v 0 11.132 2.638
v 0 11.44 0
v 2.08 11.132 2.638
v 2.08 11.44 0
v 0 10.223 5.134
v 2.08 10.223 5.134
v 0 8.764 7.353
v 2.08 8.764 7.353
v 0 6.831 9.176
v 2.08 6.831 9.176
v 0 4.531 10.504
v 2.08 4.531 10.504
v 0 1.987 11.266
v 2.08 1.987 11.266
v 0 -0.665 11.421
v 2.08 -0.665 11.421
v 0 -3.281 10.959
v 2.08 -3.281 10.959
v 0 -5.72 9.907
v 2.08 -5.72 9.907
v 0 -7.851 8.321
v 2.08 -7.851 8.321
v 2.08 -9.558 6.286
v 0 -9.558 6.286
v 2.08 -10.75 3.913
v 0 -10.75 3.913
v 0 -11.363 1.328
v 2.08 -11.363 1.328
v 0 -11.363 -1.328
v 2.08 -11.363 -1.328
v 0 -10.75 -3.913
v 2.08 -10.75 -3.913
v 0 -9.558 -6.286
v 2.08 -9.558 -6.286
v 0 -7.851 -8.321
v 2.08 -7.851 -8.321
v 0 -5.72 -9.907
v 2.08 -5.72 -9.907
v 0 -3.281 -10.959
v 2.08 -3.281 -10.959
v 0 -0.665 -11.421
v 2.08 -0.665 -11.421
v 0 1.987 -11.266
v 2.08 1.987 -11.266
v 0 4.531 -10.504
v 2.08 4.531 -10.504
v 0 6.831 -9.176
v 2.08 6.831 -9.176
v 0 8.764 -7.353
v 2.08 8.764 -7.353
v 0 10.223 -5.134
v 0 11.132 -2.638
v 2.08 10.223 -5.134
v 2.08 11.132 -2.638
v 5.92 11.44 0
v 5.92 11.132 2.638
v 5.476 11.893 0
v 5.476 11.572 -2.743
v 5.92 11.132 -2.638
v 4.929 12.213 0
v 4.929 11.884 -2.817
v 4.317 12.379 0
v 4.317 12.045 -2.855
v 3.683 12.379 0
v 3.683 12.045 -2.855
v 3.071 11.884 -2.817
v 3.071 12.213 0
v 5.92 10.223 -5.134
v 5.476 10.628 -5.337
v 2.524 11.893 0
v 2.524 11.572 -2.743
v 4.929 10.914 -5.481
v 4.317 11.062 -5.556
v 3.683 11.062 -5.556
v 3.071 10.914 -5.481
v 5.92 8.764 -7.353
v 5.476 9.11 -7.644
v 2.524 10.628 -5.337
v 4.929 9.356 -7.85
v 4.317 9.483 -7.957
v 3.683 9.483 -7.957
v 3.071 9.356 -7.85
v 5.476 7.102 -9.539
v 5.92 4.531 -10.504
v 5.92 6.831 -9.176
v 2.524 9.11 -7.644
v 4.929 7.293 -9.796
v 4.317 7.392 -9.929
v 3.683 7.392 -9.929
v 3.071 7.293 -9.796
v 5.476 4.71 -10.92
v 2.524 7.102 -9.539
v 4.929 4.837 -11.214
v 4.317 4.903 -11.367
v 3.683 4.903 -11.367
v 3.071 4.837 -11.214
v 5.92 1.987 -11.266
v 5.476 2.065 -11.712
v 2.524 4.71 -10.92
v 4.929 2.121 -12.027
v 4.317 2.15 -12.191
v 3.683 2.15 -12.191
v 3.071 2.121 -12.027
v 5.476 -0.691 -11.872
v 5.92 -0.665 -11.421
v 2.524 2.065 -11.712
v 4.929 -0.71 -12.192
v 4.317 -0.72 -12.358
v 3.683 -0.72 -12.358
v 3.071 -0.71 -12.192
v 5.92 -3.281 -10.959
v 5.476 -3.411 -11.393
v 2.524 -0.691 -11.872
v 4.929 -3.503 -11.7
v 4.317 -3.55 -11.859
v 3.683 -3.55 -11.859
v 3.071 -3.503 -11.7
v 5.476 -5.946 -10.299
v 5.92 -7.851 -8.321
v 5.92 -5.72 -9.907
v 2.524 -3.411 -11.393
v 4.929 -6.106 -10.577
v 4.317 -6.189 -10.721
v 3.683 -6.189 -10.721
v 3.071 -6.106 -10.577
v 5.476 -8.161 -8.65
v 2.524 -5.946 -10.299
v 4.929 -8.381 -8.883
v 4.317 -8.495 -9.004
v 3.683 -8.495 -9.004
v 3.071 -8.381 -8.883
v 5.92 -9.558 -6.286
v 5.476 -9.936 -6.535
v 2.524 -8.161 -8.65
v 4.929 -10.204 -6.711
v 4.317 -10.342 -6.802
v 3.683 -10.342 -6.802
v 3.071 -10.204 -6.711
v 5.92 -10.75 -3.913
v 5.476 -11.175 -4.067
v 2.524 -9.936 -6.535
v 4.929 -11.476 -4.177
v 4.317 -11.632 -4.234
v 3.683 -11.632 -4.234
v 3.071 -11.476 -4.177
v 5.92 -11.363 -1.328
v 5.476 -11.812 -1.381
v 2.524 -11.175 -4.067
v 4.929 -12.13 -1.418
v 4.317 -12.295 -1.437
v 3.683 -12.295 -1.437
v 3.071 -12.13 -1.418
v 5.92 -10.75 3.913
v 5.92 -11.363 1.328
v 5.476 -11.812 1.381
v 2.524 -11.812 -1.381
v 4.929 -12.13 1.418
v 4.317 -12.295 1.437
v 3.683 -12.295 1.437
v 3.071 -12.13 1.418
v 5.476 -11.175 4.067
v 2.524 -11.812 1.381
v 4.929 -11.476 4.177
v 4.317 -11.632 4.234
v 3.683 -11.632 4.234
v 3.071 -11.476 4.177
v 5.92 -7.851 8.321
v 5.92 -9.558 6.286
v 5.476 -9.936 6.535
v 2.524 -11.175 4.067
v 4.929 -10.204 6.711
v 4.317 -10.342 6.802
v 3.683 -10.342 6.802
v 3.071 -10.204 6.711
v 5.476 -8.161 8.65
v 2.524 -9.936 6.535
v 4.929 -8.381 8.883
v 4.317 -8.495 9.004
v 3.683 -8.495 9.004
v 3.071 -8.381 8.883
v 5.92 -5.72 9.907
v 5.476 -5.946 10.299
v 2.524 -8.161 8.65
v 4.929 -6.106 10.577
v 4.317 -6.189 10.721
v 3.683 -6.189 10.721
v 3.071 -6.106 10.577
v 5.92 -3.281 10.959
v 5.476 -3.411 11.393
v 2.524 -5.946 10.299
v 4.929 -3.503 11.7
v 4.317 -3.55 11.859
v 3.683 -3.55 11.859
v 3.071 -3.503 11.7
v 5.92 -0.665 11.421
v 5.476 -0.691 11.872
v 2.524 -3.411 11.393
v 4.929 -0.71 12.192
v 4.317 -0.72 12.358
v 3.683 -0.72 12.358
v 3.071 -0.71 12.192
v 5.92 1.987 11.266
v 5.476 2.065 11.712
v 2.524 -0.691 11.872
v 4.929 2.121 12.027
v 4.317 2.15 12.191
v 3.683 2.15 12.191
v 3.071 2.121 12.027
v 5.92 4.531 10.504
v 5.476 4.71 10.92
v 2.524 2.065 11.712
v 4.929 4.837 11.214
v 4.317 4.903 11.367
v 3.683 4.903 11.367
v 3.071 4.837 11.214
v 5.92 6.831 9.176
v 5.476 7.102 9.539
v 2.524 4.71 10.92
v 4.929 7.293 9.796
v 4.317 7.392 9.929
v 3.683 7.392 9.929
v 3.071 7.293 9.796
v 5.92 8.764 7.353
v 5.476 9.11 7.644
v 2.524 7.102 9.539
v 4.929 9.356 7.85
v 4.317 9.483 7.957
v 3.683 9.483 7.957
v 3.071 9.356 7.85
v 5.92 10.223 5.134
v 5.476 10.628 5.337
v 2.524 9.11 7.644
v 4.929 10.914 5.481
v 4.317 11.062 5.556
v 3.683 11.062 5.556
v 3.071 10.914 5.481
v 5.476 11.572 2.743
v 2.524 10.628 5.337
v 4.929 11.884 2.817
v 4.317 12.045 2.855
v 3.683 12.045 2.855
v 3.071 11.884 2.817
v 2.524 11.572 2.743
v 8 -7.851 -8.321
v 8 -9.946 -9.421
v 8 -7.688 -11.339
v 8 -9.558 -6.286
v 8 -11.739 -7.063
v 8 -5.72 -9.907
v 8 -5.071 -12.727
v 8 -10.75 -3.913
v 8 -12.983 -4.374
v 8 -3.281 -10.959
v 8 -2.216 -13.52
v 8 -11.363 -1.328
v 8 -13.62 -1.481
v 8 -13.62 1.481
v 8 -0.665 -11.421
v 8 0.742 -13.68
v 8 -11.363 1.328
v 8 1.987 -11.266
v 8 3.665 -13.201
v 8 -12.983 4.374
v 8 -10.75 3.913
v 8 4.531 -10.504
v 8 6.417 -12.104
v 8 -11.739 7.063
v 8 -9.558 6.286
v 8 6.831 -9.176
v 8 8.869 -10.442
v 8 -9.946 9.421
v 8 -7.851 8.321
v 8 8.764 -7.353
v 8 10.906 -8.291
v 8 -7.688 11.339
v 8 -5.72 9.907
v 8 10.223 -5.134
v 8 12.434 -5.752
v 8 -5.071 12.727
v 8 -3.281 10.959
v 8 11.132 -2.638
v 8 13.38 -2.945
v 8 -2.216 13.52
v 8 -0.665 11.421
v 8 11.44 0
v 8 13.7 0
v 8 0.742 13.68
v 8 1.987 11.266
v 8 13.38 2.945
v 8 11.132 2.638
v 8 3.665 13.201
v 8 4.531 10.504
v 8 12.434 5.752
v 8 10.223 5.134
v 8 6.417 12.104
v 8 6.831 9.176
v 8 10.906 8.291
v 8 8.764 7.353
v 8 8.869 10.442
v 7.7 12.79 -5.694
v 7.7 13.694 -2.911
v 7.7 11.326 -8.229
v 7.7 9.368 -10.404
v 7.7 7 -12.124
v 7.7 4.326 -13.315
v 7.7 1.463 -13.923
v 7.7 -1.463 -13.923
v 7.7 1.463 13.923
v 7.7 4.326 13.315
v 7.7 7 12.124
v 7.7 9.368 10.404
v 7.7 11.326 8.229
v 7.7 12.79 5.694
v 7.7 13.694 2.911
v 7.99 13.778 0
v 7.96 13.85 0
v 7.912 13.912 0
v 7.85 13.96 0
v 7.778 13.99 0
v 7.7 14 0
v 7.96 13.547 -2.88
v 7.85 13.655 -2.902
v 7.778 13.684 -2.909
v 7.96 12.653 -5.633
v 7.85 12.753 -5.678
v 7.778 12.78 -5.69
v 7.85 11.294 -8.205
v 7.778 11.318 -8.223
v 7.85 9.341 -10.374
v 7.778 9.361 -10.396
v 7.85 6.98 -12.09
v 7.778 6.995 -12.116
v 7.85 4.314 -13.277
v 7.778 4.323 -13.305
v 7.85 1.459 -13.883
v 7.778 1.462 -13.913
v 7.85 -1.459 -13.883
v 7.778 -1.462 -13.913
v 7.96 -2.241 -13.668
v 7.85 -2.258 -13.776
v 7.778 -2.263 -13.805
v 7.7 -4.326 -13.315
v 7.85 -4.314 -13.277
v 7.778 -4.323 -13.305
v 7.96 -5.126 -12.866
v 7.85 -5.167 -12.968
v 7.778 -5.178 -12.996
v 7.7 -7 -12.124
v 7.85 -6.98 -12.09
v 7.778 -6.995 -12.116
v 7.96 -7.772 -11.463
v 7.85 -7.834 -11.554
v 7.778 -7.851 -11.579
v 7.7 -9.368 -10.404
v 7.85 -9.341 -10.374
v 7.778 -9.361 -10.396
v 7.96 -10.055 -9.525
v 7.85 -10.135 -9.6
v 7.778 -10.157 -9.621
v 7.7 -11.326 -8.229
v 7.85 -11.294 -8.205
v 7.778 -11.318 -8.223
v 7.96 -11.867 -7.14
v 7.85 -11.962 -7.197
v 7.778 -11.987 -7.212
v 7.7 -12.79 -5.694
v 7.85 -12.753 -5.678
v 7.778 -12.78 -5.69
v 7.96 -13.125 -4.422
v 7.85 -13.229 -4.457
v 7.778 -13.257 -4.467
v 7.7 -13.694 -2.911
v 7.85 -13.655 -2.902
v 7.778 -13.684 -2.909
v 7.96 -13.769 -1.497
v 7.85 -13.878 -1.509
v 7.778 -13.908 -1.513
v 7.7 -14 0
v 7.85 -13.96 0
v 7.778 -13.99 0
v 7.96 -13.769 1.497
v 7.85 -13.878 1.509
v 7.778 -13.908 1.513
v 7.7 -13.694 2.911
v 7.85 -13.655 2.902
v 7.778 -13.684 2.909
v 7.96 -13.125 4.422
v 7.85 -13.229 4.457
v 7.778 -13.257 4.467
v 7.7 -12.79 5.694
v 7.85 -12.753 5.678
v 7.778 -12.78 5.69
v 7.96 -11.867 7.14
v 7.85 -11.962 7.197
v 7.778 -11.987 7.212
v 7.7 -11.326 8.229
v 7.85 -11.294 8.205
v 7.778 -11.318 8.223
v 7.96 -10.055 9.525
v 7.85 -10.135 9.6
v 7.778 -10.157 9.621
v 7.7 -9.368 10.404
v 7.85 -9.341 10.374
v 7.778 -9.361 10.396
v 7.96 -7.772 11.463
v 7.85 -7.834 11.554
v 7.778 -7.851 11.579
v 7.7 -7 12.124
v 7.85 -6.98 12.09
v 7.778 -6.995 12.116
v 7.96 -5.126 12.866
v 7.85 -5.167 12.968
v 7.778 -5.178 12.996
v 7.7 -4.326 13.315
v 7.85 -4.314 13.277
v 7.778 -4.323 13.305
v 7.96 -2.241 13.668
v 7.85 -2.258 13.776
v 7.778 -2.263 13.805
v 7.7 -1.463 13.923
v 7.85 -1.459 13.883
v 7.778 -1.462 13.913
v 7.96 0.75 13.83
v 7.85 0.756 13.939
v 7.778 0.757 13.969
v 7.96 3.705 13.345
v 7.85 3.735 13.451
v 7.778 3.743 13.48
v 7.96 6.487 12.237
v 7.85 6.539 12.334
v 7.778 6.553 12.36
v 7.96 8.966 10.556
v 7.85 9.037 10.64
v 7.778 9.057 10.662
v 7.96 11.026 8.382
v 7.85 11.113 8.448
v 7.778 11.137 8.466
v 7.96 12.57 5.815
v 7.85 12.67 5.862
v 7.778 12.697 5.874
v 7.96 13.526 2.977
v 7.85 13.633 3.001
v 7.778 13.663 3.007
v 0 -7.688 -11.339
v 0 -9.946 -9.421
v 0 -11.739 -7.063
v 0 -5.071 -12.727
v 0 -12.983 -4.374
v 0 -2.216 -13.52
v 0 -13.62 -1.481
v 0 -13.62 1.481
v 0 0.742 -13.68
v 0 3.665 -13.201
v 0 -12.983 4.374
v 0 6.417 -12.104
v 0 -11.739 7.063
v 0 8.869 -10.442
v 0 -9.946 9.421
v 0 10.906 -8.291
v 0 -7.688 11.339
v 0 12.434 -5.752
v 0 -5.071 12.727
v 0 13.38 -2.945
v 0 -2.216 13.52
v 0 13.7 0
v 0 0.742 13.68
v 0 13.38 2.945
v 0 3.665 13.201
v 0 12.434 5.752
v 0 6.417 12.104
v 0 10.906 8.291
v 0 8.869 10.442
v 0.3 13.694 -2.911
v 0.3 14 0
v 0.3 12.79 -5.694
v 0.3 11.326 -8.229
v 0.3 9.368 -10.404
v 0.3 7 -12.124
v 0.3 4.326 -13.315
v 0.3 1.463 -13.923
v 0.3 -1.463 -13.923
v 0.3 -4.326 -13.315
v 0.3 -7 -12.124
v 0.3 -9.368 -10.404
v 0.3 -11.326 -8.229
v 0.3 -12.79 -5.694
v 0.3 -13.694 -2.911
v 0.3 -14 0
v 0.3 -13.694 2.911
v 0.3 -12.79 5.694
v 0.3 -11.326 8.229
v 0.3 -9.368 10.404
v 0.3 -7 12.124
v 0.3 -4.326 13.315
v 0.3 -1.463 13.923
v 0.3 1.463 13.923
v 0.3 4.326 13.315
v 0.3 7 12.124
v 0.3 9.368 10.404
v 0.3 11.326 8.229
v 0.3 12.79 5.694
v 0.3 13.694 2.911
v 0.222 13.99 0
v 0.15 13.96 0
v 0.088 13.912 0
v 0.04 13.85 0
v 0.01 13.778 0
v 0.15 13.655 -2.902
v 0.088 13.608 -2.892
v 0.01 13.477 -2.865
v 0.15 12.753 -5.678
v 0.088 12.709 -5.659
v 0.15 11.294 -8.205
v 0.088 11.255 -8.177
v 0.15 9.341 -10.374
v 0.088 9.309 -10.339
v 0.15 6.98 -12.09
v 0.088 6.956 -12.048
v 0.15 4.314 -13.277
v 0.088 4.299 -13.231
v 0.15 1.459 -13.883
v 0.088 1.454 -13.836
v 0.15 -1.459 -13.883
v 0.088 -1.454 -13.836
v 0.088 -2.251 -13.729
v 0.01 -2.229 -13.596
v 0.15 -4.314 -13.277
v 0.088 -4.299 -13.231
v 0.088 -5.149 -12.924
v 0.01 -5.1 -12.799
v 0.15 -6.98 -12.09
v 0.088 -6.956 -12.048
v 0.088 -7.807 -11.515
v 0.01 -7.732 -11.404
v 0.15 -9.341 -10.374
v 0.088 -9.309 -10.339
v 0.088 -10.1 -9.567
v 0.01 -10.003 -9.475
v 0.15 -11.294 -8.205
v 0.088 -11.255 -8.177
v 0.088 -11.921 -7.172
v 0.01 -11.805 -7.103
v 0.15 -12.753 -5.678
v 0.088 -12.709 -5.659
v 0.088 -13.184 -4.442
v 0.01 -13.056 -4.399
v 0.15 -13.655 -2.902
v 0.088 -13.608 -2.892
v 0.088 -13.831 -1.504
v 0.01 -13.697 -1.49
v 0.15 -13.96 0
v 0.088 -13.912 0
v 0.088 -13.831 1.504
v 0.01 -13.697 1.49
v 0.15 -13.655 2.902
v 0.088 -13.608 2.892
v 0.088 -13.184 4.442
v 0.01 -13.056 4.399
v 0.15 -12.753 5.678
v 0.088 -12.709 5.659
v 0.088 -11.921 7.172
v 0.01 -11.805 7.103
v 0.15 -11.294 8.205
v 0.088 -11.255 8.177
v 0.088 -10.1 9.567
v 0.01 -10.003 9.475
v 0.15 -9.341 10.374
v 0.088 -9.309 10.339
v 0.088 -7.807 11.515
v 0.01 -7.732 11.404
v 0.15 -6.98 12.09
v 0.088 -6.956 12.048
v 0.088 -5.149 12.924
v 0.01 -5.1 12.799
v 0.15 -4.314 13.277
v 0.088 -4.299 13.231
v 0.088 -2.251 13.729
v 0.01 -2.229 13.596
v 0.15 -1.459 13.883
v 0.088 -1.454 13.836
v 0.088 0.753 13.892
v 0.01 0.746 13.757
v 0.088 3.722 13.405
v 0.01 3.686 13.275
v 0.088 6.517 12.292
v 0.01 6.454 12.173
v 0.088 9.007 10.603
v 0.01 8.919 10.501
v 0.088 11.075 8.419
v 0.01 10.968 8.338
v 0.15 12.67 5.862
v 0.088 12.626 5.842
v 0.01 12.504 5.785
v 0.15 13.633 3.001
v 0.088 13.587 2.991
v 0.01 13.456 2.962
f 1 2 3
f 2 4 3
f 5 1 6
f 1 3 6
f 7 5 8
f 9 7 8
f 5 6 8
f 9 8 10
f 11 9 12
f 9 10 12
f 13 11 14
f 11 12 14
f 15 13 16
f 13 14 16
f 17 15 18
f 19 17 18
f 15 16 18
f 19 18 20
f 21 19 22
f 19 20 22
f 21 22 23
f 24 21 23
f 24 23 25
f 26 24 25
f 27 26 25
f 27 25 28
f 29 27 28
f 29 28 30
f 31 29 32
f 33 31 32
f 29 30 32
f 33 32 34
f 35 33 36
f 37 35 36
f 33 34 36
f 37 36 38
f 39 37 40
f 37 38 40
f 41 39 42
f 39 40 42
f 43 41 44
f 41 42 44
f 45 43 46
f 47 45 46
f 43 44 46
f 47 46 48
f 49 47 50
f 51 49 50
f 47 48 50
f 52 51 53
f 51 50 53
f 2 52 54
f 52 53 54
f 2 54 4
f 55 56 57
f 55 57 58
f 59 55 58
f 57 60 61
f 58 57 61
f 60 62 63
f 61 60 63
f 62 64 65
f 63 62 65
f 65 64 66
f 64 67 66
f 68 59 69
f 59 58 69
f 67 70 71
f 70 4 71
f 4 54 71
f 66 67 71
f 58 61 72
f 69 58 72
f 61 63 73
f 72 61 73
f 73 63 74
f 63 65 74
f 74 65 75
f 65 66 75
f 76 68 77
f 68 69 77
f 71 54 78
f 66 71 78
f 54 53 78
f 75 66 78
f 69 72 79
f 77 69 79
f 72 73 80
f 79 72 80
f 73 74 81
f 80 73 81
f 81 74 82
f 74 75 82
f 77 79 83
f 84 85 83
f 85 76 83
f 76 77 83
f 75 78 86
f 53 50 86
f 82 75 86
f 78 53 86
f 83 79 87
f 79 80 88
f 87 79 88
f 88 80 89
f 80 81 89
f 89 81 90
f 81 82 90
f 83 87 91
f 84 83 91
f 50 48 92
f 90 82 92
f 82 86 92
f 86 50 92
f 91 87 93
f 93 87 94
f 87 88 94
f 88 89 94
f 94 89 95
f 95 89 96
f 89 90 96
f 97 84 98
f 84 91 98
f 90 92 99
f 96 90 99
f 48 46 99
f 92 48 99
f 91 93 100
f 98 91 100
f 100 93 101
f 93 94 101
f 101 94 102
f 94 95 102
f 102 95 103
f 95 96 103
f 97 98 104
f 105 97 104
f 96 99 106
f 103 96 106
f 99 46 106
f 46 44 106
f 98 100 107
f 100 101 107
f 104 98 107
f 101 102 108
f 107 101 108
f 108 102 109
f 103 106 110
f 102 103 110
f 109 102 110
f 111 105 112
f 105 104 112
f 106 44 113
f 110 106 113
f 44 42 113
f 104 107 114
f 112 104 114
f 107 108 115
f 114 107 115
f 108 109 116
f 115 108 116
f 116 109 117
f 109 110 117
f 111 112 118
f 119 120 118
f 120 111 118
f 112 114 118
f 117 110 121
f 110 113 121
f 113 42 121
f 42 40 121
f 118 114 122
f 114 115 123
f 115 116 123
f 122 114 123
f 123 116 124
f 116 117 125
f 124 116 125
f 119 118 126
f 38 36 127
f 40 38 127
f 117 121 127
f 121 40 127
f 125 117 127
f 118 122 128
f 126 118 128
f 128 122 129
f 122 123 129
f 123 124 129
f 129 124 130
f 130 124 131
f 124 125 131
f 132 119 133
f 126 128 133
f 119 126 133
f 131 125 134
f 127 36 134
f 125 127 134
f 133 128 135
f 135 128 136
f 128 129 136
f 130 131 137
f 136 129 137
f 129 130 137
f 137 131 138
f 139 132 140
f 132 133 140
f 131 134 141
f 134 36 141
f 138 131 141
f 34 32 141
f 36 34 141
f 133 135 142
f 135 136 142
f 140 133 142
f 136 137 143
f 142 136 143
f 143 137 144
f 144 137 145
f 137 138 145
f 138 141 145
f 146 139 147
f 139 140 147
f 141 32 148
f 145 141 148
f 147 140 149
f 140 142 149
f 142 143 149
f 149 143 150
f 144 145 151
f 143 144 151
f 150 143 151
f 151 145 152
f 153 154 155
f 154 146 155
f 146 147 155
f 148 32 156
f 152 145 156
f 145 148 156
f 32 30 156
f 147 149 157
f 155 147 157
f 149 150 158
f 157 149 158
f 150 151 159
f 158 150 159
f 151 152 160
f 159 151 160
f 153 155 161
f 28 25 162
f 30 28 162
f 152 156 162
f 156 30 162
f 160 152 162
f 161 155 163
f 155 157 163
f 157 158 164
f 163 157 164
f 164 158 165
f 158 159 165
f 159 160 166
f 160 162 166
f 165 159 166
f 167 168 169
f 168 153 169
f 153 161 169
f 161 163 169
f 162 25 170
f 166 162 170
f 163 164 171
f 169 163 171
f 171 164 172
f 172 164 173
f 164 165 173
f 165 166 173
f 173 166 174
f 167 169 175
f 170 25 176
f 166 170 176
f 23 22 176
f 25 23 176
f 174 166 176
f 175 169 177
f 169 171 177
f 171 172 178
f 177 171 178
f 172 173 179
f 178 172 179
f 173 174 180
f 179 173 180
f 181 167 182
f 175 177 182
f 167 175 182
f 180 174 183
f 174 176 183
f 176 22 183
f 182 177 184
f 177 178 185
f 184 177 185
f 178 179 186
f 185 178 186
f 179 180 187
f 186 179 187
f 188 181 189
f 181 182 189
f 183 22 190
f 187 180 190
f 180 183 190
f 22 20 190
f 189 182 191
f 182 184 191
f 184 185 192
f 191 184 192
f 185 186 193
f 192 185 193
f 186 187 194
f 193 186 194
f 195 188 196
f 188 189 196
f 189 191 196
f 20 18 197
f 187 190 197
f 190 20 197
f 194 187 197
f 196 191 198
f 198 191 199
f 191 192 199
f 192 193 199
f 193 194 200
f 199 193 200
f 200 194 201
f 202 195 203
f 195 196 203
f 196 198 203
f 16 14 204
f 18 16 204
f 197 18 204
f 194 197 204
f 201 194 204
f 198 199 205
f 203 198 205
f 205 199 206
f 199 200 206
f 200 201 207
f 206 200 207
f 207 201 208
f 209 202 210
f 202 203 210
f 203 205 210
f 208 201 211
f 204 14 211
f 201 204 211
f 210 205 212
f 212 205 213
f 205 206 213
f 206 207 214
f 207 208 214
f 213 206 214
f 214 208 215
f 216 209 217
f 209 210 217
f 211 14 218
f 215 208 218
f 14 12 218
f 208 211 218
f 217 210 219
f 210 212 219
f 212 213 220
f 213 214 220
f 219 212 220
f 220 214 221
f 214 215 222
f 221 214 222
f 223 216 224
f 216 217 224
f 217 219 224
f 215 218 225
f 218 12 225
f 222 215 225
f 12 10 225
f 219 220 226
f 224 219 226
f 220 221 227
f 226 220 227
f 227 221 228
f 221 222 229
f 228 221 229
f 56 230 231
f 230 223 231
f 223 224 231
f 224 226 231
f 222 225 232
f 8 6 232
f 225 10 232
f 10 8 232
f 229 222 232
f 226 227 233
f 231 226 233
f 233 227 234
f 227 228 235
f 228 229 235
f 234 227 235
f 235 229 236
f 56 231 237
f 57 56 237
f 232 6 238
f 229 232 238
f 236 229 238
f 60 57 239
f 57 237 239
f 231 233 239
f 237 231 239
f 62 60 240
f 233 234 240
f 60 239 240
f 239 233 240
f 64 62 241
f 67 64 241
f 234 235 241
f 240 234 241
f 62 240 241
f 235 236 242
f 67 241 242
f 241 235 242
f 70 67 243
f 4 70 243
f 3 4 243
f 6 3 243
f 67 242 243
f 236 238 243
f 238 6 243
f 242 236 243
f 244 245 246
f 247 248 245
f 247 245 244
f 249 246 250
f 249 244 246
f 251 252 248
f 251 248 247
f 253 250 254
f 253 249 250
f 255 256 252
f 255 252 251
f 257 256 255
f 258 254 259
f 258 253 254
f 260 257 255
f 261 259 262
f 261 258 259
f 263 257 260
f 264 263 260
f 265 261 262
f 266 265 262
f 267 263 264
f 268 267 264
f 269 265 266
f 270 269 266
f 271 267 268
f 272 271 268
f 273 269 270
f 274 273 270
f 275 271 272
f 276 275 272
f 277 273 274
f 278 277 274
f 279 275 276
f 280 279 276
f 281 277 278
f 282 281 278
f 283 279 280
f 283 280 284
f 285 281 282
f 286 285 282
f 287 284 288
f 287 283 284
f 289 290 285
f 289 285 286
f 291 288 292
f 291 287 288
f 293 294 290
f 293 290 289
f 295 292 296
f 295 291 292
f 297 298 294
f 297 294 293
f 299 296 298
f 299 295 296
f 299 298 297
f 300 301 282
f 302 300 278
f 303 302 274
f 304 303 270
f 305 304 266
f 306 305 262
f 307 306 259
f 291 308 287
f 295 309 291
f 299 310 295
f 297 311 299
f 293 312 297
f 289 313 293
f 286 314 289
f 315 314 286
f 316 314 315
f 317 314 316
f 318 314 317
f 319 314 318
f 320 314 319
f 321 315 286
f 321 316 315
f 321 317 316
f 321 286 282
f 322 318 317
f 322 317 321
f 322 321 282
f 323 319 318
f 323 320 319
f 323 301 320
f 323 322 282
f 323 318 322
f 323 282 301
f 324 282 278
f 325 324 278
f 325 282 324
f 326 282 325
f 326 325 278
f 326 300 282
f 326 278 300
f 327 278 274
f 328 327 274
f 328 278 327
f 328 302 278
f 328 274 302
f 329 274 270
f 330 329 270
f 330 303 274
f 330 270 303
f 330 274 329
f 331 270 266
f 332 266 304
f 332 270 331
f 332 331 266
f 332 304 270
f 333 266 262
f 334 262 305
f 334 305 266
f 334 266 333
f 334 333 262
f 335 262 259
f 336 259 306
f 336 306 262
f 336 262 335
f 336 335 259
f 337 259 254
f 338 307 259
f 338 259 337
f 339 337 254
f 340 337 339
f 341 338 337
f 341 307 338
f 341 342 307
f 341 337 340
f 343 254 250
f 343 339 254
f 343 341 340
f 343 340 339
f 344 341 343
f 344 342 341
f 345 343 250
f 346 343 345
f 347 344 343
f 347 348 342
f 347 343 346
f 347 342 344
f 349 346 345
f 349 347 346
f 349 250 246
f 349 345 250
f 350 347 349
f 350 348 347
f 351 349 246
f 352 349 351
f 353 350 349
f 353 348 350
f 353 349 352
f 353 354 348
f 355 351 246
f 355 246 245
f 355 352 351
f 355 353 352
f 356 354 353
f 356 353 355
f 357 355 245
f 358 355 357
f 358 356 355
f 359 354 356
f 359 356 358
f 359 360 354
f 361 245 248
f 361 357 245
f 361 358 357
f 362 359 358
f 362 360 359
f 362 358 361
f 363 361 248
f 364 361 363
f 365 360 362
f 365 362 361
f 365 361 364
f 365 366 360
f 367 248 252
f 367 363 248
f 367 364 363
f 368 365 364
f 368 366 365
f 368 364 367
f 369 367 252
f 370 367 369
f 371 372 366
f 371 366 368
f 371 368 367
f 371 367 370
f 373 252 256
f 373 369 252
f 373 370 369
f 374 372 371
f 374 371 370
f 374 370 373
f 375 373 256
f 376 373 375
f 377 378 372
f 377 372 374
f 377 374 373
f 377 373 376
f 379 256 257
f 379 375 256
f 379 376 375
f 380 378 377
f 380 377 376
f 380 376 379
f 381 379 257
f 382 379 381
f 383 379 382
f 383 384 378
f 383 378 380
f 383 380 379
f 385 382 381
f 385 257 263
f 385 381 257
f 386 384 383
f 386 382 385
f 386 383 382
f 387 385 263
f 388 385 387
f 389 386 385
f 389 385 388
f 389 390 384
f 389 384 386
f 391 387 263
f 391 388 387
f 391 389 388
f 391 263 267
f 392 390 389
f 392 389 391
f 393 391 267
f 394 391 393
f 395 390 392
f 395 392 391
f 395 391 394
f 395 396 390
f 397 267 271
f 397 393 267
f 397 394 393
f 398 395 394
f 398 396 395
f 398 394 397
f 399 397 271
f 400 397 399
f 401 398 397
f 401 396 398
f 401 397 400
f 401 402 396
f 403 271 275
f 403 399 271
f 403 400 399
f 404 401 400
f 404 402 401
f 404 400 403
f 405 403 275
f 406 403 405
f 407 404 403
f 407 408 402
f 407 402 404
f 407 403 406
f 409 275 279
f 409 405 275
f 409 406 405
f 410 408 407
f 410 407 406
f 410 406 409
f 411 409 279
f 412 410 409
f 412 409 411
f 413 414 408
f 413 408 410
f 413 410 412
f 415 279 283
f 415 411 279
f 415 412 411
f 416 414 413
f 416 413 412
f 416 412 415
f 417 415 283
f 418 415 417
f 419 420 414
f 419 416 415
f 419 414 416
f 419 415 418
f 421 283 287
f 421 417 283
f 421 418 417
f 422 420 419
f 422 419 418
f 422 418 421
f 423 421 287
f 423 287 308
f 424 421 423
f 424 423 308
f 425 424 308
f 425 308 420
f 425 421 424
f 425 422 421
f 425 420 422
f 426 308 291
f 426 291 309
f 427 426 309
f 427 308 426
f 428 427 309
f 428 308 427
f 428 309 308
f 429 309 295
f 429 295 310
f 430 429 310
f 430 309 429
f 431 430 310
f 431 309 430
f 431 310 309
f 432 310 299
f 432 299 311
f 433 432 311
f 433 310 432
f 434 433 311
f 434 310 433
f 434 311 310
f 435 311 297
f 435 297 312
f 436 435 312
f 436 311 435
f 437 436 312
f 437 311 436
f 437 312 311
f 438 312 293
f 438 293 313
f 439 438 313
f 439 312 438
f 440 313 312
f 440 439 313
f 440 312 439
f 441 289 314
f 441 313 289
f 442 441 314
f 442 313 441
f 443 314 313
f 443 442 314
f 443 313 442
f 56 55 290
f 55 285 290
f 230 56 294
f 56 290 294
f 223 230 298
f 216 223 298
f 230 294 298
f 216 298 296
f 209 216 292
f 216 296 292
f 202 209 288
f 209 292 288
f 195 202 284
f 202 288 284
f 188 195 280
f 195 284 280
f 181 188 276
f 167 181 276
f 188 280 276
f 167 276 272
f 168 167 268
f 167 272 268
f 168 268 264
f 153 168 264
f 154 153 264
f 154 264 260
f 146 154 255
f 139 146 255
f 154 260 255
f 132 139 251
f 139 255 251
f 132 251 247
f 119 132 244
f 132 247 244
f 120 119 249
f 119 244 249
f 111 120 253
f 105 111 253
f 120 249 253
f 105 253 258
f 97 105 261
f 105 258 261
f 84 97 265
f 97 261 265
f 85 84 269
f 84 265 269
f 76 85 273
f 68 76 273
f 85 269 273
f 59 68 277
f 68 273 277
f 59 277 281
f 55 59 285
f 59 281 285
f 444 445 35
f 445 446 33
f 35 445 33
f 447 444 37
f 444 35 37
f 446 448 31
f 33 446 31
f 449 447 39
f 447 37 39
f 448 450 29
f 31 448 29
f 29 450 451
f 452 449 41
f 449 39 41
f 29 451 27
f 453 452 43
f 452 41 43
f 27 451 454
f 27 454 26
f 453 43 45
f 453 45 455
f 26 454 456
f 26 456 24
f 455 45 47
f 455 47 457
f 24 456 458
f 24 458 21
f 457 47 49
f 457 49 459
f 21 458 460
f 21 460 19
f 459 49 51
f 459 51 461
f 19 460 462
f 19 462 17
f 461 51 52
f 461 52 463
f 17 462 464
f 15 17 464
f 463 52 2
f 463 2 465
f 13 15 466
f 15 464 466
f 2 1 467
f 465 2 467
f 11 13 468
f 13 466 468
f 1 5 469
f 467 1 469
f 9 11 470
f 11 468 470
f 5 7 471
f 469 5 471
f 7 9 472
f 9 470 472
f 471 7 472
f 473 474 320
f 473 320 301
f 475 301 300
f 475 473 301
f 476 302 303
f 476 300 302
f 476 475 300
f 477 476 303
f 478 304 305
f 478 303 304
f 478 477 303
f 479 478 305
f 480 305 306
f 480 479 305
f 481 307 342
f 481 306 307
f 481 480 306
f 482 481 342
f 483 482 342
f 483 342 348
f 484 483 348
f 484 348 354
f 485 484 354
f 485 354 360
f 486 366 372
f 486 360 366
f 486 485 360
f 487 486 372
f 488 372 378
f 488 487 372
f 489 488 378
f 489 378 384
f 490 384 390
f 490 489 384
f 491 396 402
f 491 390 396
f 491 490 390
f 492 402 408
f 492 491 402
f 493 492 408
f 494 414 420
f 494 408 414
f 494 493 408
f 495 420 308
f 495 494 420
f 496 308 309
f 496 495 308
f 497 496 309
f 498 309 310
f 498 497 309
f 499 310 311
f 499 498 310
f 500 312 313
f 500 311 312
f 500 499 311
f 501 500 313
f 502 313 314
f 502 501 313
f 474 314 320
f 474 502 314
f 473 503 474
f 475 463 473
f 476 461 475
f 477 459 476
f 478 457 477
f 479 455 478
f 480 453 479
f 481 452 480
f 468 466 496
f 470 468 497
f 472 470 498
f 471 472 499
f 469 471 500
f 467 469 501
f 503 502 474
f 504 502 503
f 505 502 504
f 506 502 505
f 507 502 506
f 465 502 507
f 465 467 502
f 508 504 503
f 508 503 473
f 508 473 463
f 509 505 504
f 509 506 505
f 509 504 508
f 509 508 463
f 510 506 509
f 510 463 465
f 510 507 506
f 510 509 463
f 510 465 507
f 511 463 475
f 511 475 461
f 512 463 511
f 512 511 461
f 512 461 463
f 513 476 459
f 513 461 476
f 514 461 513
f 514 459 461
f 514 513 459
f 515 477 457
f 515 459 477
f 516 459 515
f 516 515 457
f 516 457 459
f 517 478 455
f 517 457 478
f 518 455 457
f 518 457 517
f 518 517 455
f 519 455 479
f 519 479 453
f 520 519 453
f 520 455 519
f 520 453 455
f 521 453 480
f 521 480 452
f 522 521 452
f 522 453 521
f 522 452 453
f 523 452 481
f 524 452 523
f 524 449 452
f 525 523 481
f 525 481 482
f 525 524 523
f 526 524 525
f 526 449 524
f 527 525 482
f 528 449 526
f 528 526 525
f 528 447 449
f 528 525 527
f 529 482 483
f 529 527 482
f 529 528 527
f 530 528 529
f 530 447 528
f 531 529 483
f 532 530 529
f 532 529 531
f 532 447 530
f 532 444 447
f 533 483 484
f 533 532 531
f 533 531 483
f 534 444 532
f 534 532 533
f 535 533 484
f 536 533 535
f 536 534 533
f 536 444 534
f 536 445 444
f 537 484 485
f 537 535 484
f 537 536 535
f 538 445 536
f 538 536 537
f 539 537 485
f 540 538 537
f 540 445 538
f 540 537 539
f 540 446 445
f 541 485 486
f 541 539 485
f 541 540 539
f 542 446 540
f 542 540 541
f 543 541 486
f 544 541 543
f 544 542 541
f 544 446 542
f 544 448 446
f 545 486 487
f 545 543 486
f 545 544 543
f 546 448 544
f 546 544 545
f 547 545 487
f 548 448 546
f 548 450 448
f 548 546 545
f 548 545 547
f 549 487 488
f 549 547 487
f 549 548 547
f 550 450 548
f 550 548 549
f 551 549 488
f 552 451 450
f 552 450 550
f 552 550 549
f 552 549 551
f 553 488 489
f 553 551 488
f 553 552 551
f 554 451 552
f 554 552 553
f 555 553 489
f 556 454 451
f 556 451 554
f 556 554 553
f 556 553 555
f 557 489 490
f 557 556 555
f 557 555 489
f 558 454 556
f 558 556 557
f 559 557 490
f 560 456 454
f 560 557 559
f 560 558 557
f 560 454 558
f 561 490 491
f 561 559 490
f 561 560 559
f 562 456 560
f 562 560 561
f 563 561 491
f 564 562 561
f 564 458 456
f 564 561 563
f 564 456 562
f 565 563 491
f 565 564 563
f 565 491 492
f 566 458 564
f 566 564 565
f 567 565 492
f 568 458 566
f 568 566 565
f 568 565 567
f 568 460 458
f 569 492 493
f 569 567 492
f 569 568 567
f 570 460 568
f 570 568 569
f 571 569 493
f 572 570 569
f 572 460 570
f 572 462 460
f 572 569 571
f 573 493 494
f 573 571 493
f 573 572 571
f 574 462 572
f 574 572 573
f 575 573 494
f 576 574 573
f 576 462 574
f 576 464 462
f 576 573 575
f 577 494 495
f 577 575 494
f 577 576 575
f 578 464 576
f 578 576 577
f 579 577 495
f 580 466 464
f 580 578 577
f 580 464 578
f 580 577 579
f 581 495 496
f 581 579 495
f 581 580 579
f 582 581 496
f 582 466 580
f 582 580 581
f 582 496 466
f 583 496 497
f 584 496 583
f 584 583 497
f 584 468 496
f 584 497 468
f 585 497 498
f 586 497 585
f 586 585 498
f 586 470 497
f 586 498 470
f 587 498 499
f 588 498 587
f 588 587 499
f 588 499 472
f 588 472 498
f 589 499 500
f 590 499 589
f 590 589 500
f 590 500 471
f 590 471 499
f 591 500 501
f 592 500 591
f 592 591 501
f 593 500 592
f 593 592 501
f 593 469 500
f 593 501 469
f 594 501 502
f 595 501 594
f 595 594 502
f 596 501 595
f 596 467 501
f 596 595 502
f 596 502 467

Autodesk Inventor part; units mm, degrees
sketch "Sketch_1" plane through (0, 0, 0) normal (0, 0, 1) x (1, 0, 0)
  line L0 (8, 0) -> (0, 0)
  line L1 (0, 11.44) -> (2.08, 11.44)
  arc A0 (5.92, 11.44) -> (2.08, 11.44) centre (4, 10) ccw
  line L2 (5.92, 11.44) -> (8, 11.44)
  line L3 (8, 11.44) -> (8, 13.7)
  arc A1 (8, 13.7) -> (7.7, 14) centre (7.7, 13.7) ccw
  line L4 (7.7, 14) -> (0.3, 14)
  arc A2 (0.3, 14) -> (0, 13.7) centre (0.3, 13.7) ccw
  line L5 (0, 13.7) -> (0, 11.44)
revolve "Revolution1" add sketch "Sketch_1" angle 360 about axis through (8, 0, 0) along (1, 0, 0)
ref_plane "dgbb_or_XY" through (0, 0, 0) normal (1, 0, 0) x (0, 0, -1)
ref_plane "dgbb_or_YZ" through (0, 0, 0) normal (0, 0, -1) x (0, 1, 0)
ref_plane "dgbb_or_ZX" through (0, 0, 0) normal (0, 1, 0) x (1, 0, 0)
ref_plane "dgbb_or1_XY" through (8, 0, 0) normal (1, 0, 0) x (0, 0, -1)
ref_plane "dgbb_or1_YZ" through (8, 0, 0) normal (0, 0, -1) x (0, 1, 0)
ref_plane "dgbb_or1_ZX" through (8, 0, 0) normal (0, 1, 0) x (1, 0, 0)
ref_plane "dgbb_or11_1_XY" through (4, 10, 0) normal (1, 0, 0) x (0, 0, -1)
ref_plane "dgbb_or11_1_YZ" through (4, 10, 0) normal (0, 0, -1) x (0, 1, 0)
ref_plane "dgbb_or11_1_ZX" through (4, 10, 0) normal (0, 1, 0) x (1, 0, 0)
ref_plane "dgbb_or11_2_XY" through (4, 6.2349, 7.8183) normal (1, 0, 0) x (0, 0, -1)
ref_plane "dgbb_or11_2_YZ" through (4, 6.2349, 7.8183) normal (0, 0, -1) x (0, 1, 0)
ref_plane "dgbb_or11_2_ZX" through (4, 6.2349, 7.8183) normal (0, 1, 0) x (1, 0, 0)
ref_plane "dgbb_or11_3_XY" through (4, -2.2252, 9.7493) normal (1, 0, 0) x (0, 0, -1)
ref_plane "dgbb_or11_3_YZ" through (4, -2.2252, 9.7493) normal (0, 0, -1) x (0, 1, 0)
ref_plane "dgbb_or11_3_ZX" through (4, -2.2252, 9.7493) normal (0, 1, 0) x (1, 0, 0)
ref_plane "dgbb_or11_4_XY" through (4, -9.0097, 4.3388) normal (1, 0, 0) x (0, 0, -1)
ref_plane "dgbb_or11_4_YZ" through (4, -9.0097, 4.3388) normal (0, 0, -1) x (0, 1, 0)
ref_plane "dgbb_or11_4_ZX" through (4, -9.0097, 4.3388) normal (0, 1, 0) x (1, 0, 0)
ref_plane "dgbb_or11_5_XY" through (4, -9.0097, -4.3388) normal (1, 0, 0) x (0, 0, -1)
ref_plane "dgbb_or11_5_YZ" through (4, -9.0097, -4.3388) normal (0, 0, -1) x (0, 1, 0)
ref_plane "dgbb_or11_5_ZX" through (4, -9.0097, -4.3388) normal (0, 1, 0) x (1, 0, 0)
ref_plane "dgbb_or11_6_XY" through (4, -2.2252, -9.7493) normal (1, 0, 0) x (0, 0, -1)
ref_plane "dgbb_or11_6_YZ" through (4, -2.2252, -9.7493) normal (0, 0, -1) x (0, 1, 0)
ref_plane "dgbb_or11_6_ZX" through (4, -2.2252, -9.7493) normal (0, 1, 0) x (1, 0, 0)
ref_plane "dgbb_or11_7_XY" through (4, 6.2349, -7.8183) normal (1, 0, 0) x (0, 0, -1)
ref_plane "dgbb_or11_7_YZ" through (4, 6.2349, -7.8183) normal (0, 0, -1) x (0, 1, 0)
ref_plane "dgbb_or11_7_ZX" through (4, 6.2349, -7.8183) normal (0, 1, 0) x (1, 0, 0)
properties part number "6001JRX Outer Ring"
